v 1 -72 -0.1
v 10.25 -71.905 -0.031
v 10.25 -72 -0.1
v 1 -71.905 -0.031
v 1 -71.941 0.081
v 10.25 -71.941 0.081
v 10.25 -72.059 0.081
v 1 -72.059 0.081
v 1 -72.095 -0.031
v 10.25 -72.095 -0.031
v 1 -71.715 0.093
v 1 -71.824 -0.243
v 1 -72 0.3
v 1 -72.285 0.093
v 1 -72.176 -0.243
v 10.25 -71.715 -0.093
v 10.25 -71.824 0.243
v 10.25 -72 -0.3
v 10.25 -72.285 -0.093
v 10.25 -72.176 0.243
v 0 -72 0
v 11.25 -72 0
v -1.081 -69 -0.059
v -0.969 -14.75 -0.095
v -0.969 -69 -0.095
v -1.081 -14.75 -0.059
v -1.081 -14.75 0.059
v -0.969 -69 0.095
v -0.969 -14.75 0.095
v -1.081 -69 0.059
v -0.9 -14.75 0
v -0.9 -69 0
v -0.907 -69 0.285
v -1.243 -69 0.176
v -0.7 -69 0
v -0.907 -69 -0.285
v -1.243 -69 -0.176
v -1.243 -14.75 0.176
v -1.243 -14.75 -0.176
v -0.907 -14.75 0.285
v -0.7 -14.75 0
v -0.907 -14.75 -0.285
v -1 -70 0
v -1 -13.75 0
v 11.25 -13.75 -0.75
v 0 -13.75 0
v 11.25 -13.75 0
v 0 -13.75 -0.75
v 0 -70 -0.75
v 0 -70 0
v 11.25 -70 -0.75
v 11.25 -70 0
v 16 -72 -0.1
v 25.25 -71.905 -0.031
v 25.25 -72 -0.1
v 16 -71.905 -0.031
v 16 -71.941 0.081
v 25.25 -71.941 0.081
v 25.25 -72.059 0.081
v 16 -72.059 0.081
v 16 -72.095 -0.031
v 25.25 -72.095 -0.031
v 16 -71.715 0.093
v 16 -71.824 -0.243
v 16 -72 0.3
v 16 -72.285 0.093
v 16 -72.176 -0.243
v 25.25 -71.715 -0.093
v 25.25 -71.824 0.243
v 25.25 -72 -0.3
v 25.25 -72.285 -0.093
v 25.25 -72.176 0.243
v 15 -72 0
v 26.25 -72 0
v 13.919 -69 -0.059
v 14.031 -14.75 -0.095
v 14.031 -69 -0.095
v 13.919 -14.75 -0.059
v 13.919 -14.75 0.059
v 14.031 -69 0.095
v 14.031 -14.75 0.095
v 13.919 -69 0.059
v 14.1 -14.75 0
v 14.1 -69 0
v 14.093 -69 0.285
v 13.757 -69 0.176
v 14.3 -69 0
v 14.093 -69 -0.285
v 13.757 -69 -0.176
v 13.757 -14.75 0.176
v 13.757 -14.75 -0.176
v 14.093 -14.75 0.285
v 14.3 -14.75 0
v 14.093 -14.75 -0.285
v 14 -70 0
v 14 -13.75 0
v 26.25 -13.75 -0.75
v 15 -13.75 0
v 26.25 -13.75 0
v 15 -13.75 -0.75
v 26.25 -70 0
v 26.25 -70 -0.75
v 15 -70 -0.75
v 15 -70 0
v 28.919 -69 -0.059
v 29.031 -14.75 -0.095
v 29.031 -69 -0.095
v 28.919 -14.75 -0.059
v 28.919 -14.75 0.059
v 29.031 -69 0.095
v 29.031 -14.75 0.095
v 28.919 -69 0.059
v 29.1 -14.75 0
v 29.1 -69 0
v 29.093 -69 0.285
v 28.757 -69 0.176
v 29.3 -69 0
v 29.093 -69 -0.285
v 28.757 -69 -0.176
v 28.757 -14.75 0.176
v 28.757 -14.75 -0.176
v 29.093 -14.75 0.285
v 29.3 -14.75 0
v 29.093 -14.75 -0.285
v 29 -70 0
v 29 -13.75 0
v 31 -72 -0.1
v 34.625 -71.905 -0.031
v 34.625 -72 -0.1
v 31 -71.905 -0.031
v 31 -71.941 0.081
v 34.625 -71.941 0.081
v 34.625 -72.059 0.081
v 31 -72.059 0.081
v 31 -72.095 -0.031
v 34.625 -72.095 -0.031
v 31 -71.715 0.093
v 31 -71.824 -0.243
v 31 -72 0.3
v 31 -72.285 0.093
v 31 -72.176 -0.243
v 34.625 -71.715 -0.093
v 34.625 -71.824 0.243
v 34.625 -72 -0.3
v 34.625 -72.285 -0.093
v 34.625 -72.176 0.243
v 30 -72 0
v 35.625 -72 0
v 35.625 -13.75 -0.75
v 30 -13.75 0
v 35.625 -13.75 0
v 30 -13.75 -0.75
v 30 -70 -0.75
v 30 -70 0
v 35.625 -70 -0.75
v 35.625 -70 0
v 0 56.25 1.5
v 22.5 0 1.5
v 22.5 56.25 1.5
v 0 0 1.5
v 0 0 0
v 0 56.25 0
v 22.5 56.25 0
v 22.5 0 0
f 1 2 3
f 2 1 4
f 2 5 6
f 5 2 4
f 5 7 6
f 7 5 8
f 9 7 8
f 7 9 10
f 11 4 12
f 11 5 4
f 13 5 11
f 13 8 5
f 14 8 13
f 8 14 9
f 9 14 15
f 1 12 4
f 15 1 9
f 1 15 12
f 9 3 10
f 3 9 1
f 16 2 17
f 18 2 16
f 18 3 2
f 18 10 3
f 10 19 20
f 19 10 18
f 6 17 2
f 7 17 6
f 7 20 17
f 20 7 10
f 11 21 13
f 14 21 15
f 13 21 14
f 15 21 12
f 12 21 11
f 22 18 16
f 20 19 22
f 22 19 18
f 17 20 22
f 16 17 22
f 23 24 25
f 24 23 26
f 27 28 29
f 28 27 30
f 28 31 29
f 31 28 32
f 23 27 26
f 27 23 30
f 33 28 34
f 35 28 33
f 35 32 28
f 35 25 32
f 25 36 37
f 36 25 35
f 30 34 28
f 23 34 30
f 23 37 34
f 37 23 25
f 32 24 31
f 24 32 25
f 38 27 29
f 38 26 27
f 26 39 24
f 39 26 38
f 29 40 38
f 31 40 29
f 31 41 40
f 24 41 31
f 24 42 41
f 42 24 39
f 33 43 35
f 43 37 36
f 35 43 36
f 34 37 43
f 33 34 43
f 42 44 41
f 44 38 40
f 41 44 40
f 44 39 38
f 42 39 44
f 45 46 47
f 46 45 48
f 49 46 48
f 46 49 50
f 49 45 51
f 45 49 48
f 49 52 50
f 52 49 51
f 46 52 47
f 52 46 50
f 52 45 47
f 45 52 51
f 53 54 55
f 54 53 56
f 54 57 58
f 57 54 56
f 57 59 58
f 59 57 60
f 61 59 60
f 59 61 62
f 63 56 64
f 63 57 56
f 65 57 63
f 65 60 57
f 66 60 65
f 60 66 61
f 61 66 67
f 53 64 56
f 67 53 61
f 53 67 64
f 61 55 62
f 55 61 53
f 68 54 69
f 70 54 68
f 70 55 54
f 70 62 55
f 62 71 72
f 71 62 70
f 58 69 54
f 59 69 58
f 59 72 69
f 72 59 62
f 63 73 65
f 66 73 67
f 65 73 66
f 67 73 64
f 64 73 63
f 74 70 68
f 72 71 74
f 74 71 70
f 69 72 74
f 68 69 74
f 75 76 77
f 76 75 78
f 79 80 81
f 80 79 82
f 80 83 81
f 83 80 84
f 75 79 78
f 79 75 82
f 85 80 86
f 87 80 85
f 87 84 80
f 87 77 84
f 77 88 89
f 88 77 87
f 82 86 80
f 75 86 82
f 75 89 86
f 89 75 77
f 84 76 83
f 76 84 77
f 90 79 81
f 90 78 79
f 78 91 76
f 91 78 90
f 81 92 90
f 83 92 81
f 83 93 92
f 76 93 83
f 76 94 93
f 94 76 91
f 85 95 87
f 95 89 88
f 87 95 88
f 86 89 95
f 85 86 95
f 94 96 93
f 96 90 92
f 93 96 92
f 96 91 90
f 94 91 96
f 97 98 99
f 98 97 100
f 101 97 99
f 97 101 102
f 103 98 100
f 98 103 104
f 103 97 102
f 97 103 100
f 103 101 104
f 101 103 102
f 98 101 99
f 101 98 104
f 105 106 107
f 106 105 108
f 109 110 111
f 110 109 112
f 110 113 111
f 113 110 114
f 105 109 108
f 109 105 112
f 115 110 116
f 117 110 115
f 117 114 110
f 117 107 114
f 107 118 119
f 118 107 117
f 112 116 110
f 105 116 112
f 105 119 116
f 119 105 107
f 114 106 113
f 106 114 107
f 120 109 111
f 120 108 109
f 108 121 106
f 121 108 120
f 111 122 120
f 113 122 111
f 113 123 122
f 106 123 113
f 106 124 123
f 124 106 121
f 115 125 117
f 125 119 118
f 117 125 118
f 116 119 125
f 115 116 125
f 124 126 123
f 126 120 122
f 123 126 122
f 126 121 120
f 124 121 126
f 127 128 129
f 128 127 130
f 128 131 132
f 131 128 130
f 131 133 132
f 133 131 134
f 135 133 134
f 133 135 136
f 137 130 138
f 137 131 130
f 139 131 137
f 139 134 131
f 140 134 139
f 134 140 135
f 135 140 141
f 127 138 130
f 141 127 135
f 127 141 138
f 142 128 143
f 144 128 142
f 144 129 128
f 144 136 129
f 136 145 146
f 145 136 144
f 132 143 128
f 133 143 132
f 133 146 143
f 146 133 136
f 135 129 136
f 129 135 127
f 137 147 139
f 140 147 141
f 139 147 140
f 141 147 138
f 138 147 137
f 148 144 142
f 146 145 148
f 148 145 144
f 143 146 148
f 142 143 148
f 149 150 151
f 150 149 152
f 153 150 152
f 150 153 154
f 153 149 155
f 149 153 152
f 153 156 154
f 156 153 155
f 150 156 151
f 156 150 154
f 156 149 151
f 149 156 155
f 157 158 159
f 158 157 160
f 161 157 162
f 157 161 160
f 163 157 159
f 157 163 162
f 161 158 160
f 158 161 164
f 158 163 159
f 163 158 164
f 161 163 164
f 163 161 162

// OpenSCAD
// file: ../lib/common.scad
//--------------------------------------------------------------------------------------------------
// Module Prism
//--------------------------------------------------------------------------------------------------
module prism(z, y, x)
{
    rotate([0, 90, 0])
    {
        polyhedron(
                points=[[0,0,0], [x,0,0], [x,y,0], [0,y,0], [0,y,z], [x,y,z]],
                faces=[[0,1,2,3],[5,4,3,2],[0,4,5,1],[0,3,4],[5,2,1]]);
    }
}

//--------------------------------------------------------------------------------------------------
// Module Side panel
//--------------------------------------------------------------------------------------------------
module rect_cut(x, y, z, dx, dy)
{
    // Top panel
    translate([0, dy, 0])
    {
        cube([x, y - dy, z]);
    };

    // Left bottom panel
    translate([0, 0, 0])
    {
        cube([dx, dy, z]);
    };

    // Triangle
    translate([dx, 0, 0])
    {
        rotate([0, 0, 0])
        {
            prism(x - dx, dy, -z);
        }
    };
}

//--------------------------------------------------------------------------------------------------
// X dimensional arrow
//--------------------------------------------------------------------------------------------------
module arrow_x(l)
{
    line_w = 0.1;
    arrow_w = 1;
    arrow_h = 0.3;

    // Line
    translate([l / 2, 0, 0])
    {
        rotate([0, 90, 0])
        {
            color([0.4, 0.4, 0.4])
            cylinder(l - arrow_w * 2, line_w, line_w, true);
        }
    }

    // Left arrow
    translate([arrow_w, 0, 0])
    {
        rotate([0, 270, 0])
        {
            color([0.4, 0.4, 0.4])
            cylinder(arrow_w, arrow_h, 0, false);
        }
    }

    // Right arrow
    translate([l - arrow_w, 0, 0])
    {
        rotate([0, 90, 0])
        {
            color([0.4, 0.4, 0.4])
            cylinder(arrow_w, arrow_h, 0, false);
        }
    }

    // Text
    translate([l/3, 0.5, 0])
    {
        color([0.4, 0.4, 0.4])
        text(str(l), size=1);
    }
}

//--------------------------------------------------------------------------------------------------
// Y dimensional arrow
//--------------------------------------------------------------------------------------------------
module arrow_y(l)
{
    line_w = 0.1;
    arrow_w = 1;
    arrow_h = 0.3;

    // Line
    translate([0, l / 2, 0])
    {
        rotate([90, 0, 00])
        {
            color([0.4, 0.4, 0.4])
            cylinder(l - arrow_w * 2, line_w, line_w, true);
        }
    }

    // Left arrow
    translate([0 ,arrow_w, 0])
    {
        rotate([90, 0, 0])
        {
            color([0.4, 0.4, 0.4])
            cylinder(arrow_w, arrow_h, 0, false);
        }
    }

    // Right arrow
    translate([0, l - arrow_w, 0])
    {
        rotate([270, 0, 0])
        {
            color([0.4, 0.4, 0.4])
            cylinder(arrow_w, arrow_h, 0, false);
        }
    }

    // Text
    translate([-0.5, l/3, 0])
    {
        rotate([0 ,0, 90])
        {
            color([0.4, 0.4, 0.4])
            text(str(l), size=1);
        }
    }
}

//--------------------------------------------------------------------------------------------------
// Z dimensional arrow
//--------------------------------------------------------------------------------------------------
module arrow_z(l)
{
    line_w = 0.11;
    arrow_w = 1;
    arrow_h = 0.3;

    // Line
    translate([0, 0, l / 2])
    {
        rotate([0, 0, 0])
        {
            color([0.4, 0.4, 0.4])
            cylinder(l - arrow_w * 2, line_w, line_w, true);
        }
    }

    // Left arrow
    translate([0, 0, arrow_w])
    {
        rotate([0, 180, 0])
        {
            color([0.4, 0.4, 0.4])
            cylinder(arrow_w, arrow_h, 0, false);
        }
    }

    // Right arrow
    translate([0, 0, l - arrow_w])
    {
        rotate([0, 0, 0])
        {
            color([0.4, 0.4, 0.4])
            cylinder(arrow_w, arrow_h, 0, false);
        }
    }

    // Text
    translate([0.5, 0, l/3])
    {
        rotate([90 ,0, 90])
        {
            color([0.4, 0.4, 0.4])
            text(str(l), size=1);
        }
    }
}

//--------------------------------------------------------------------------------------------------
// parallelogram
//--------------------------------------------------------------------------------------------------
module parallelogram(x = 12, y = 12, z = 1, xd = 0)
{
    points = [
        [0, 0, 0 ],        //0
        [x, 0, 0 ],        //1
        [x + xd, y, 0],    //2
        [xd, y, 0 ],       //3
        [0, 0, z ],        //4
        [x, 0, z ],        //5
        [x + xd, y, z ],   //6
        [xd, y, z ]];      //7

    faces = [
        [0,1,2,3],         // bottom
        [4,5,1,0],         // front
        [7,6,5,4],         // top
        [5,6,2,1],         // right
        [6,7,3,2],         // back
        [7,4,0,3]];        // left

    polyhedron(points, faces);
}

//--------------------------------------------------------------------------------------------------
// common board
//--------------------------------------------------------------------------------------------------
module board(w, h, d, r, g, b)
{
    color([r, g, b])
    cube([w, h, d]);
}

//--------------------------------------------------------------------------------------------------
// board dimension
//--------------------------------------------------------------------------------------------------
module dimension(w, h, d, r, g, b, part_x, part_y)
{
    translate([part_x, -part_y, 0])
    {
        rotate([-90, 0, 0])
        {
            board(w, h, d, r, g, b);
        }
            
        translate([0, -2, 0])
        {
            color([0, 0, 0])
            arrow_x(w);
        };

        translate([-1, 0, 0])
        {
            color([0, 0, 0])
            arrow_y(d);
        };
    }
}
// main file
/*
29 X 56
11.25 X 2 X 6ft = 22.5 : $34.5 X 2 = $69

Poplar: 1 X 10 ft 
Pine:   1 X 10 ft
*/

include <../lib/common.scad>

// Top
// 56.25 X 2 = 112.5
// 1 X 10 ft
translate([0, 0, 0.75])
{
    board(11.25, 56.25, 0.75, 0, 1, 0);
}
dimension(11.25, 0.75, 56.25, 0, 1, 0, 0, 70);

translate([11.25, 0, 0.75])
{
    board(11.25, 56.25, 0.75, 0, 1, 0);
}

// Bottom
// 22.5 X 5 = 122.5
// 1 X 10 ft pine board
translate([5.625, 0, 0])
{
    board(11.25, 56.25, 0.75, 1, 0, 0);
}
dimension(11.25, 0.75, 56.25, 1, 0, 0, 15, 70);

translate([0, 0, 0])
{
    board(5.625, 56.25, 0.75, 0, 0, 1);
}
dimension(5.625, 0.75, 56.25, 0, 0, 1, 30, 70);

translate([16.875, 0, 0])
{
    board(5.625, 56.25, 0.75, 0, 0, 1);
}
